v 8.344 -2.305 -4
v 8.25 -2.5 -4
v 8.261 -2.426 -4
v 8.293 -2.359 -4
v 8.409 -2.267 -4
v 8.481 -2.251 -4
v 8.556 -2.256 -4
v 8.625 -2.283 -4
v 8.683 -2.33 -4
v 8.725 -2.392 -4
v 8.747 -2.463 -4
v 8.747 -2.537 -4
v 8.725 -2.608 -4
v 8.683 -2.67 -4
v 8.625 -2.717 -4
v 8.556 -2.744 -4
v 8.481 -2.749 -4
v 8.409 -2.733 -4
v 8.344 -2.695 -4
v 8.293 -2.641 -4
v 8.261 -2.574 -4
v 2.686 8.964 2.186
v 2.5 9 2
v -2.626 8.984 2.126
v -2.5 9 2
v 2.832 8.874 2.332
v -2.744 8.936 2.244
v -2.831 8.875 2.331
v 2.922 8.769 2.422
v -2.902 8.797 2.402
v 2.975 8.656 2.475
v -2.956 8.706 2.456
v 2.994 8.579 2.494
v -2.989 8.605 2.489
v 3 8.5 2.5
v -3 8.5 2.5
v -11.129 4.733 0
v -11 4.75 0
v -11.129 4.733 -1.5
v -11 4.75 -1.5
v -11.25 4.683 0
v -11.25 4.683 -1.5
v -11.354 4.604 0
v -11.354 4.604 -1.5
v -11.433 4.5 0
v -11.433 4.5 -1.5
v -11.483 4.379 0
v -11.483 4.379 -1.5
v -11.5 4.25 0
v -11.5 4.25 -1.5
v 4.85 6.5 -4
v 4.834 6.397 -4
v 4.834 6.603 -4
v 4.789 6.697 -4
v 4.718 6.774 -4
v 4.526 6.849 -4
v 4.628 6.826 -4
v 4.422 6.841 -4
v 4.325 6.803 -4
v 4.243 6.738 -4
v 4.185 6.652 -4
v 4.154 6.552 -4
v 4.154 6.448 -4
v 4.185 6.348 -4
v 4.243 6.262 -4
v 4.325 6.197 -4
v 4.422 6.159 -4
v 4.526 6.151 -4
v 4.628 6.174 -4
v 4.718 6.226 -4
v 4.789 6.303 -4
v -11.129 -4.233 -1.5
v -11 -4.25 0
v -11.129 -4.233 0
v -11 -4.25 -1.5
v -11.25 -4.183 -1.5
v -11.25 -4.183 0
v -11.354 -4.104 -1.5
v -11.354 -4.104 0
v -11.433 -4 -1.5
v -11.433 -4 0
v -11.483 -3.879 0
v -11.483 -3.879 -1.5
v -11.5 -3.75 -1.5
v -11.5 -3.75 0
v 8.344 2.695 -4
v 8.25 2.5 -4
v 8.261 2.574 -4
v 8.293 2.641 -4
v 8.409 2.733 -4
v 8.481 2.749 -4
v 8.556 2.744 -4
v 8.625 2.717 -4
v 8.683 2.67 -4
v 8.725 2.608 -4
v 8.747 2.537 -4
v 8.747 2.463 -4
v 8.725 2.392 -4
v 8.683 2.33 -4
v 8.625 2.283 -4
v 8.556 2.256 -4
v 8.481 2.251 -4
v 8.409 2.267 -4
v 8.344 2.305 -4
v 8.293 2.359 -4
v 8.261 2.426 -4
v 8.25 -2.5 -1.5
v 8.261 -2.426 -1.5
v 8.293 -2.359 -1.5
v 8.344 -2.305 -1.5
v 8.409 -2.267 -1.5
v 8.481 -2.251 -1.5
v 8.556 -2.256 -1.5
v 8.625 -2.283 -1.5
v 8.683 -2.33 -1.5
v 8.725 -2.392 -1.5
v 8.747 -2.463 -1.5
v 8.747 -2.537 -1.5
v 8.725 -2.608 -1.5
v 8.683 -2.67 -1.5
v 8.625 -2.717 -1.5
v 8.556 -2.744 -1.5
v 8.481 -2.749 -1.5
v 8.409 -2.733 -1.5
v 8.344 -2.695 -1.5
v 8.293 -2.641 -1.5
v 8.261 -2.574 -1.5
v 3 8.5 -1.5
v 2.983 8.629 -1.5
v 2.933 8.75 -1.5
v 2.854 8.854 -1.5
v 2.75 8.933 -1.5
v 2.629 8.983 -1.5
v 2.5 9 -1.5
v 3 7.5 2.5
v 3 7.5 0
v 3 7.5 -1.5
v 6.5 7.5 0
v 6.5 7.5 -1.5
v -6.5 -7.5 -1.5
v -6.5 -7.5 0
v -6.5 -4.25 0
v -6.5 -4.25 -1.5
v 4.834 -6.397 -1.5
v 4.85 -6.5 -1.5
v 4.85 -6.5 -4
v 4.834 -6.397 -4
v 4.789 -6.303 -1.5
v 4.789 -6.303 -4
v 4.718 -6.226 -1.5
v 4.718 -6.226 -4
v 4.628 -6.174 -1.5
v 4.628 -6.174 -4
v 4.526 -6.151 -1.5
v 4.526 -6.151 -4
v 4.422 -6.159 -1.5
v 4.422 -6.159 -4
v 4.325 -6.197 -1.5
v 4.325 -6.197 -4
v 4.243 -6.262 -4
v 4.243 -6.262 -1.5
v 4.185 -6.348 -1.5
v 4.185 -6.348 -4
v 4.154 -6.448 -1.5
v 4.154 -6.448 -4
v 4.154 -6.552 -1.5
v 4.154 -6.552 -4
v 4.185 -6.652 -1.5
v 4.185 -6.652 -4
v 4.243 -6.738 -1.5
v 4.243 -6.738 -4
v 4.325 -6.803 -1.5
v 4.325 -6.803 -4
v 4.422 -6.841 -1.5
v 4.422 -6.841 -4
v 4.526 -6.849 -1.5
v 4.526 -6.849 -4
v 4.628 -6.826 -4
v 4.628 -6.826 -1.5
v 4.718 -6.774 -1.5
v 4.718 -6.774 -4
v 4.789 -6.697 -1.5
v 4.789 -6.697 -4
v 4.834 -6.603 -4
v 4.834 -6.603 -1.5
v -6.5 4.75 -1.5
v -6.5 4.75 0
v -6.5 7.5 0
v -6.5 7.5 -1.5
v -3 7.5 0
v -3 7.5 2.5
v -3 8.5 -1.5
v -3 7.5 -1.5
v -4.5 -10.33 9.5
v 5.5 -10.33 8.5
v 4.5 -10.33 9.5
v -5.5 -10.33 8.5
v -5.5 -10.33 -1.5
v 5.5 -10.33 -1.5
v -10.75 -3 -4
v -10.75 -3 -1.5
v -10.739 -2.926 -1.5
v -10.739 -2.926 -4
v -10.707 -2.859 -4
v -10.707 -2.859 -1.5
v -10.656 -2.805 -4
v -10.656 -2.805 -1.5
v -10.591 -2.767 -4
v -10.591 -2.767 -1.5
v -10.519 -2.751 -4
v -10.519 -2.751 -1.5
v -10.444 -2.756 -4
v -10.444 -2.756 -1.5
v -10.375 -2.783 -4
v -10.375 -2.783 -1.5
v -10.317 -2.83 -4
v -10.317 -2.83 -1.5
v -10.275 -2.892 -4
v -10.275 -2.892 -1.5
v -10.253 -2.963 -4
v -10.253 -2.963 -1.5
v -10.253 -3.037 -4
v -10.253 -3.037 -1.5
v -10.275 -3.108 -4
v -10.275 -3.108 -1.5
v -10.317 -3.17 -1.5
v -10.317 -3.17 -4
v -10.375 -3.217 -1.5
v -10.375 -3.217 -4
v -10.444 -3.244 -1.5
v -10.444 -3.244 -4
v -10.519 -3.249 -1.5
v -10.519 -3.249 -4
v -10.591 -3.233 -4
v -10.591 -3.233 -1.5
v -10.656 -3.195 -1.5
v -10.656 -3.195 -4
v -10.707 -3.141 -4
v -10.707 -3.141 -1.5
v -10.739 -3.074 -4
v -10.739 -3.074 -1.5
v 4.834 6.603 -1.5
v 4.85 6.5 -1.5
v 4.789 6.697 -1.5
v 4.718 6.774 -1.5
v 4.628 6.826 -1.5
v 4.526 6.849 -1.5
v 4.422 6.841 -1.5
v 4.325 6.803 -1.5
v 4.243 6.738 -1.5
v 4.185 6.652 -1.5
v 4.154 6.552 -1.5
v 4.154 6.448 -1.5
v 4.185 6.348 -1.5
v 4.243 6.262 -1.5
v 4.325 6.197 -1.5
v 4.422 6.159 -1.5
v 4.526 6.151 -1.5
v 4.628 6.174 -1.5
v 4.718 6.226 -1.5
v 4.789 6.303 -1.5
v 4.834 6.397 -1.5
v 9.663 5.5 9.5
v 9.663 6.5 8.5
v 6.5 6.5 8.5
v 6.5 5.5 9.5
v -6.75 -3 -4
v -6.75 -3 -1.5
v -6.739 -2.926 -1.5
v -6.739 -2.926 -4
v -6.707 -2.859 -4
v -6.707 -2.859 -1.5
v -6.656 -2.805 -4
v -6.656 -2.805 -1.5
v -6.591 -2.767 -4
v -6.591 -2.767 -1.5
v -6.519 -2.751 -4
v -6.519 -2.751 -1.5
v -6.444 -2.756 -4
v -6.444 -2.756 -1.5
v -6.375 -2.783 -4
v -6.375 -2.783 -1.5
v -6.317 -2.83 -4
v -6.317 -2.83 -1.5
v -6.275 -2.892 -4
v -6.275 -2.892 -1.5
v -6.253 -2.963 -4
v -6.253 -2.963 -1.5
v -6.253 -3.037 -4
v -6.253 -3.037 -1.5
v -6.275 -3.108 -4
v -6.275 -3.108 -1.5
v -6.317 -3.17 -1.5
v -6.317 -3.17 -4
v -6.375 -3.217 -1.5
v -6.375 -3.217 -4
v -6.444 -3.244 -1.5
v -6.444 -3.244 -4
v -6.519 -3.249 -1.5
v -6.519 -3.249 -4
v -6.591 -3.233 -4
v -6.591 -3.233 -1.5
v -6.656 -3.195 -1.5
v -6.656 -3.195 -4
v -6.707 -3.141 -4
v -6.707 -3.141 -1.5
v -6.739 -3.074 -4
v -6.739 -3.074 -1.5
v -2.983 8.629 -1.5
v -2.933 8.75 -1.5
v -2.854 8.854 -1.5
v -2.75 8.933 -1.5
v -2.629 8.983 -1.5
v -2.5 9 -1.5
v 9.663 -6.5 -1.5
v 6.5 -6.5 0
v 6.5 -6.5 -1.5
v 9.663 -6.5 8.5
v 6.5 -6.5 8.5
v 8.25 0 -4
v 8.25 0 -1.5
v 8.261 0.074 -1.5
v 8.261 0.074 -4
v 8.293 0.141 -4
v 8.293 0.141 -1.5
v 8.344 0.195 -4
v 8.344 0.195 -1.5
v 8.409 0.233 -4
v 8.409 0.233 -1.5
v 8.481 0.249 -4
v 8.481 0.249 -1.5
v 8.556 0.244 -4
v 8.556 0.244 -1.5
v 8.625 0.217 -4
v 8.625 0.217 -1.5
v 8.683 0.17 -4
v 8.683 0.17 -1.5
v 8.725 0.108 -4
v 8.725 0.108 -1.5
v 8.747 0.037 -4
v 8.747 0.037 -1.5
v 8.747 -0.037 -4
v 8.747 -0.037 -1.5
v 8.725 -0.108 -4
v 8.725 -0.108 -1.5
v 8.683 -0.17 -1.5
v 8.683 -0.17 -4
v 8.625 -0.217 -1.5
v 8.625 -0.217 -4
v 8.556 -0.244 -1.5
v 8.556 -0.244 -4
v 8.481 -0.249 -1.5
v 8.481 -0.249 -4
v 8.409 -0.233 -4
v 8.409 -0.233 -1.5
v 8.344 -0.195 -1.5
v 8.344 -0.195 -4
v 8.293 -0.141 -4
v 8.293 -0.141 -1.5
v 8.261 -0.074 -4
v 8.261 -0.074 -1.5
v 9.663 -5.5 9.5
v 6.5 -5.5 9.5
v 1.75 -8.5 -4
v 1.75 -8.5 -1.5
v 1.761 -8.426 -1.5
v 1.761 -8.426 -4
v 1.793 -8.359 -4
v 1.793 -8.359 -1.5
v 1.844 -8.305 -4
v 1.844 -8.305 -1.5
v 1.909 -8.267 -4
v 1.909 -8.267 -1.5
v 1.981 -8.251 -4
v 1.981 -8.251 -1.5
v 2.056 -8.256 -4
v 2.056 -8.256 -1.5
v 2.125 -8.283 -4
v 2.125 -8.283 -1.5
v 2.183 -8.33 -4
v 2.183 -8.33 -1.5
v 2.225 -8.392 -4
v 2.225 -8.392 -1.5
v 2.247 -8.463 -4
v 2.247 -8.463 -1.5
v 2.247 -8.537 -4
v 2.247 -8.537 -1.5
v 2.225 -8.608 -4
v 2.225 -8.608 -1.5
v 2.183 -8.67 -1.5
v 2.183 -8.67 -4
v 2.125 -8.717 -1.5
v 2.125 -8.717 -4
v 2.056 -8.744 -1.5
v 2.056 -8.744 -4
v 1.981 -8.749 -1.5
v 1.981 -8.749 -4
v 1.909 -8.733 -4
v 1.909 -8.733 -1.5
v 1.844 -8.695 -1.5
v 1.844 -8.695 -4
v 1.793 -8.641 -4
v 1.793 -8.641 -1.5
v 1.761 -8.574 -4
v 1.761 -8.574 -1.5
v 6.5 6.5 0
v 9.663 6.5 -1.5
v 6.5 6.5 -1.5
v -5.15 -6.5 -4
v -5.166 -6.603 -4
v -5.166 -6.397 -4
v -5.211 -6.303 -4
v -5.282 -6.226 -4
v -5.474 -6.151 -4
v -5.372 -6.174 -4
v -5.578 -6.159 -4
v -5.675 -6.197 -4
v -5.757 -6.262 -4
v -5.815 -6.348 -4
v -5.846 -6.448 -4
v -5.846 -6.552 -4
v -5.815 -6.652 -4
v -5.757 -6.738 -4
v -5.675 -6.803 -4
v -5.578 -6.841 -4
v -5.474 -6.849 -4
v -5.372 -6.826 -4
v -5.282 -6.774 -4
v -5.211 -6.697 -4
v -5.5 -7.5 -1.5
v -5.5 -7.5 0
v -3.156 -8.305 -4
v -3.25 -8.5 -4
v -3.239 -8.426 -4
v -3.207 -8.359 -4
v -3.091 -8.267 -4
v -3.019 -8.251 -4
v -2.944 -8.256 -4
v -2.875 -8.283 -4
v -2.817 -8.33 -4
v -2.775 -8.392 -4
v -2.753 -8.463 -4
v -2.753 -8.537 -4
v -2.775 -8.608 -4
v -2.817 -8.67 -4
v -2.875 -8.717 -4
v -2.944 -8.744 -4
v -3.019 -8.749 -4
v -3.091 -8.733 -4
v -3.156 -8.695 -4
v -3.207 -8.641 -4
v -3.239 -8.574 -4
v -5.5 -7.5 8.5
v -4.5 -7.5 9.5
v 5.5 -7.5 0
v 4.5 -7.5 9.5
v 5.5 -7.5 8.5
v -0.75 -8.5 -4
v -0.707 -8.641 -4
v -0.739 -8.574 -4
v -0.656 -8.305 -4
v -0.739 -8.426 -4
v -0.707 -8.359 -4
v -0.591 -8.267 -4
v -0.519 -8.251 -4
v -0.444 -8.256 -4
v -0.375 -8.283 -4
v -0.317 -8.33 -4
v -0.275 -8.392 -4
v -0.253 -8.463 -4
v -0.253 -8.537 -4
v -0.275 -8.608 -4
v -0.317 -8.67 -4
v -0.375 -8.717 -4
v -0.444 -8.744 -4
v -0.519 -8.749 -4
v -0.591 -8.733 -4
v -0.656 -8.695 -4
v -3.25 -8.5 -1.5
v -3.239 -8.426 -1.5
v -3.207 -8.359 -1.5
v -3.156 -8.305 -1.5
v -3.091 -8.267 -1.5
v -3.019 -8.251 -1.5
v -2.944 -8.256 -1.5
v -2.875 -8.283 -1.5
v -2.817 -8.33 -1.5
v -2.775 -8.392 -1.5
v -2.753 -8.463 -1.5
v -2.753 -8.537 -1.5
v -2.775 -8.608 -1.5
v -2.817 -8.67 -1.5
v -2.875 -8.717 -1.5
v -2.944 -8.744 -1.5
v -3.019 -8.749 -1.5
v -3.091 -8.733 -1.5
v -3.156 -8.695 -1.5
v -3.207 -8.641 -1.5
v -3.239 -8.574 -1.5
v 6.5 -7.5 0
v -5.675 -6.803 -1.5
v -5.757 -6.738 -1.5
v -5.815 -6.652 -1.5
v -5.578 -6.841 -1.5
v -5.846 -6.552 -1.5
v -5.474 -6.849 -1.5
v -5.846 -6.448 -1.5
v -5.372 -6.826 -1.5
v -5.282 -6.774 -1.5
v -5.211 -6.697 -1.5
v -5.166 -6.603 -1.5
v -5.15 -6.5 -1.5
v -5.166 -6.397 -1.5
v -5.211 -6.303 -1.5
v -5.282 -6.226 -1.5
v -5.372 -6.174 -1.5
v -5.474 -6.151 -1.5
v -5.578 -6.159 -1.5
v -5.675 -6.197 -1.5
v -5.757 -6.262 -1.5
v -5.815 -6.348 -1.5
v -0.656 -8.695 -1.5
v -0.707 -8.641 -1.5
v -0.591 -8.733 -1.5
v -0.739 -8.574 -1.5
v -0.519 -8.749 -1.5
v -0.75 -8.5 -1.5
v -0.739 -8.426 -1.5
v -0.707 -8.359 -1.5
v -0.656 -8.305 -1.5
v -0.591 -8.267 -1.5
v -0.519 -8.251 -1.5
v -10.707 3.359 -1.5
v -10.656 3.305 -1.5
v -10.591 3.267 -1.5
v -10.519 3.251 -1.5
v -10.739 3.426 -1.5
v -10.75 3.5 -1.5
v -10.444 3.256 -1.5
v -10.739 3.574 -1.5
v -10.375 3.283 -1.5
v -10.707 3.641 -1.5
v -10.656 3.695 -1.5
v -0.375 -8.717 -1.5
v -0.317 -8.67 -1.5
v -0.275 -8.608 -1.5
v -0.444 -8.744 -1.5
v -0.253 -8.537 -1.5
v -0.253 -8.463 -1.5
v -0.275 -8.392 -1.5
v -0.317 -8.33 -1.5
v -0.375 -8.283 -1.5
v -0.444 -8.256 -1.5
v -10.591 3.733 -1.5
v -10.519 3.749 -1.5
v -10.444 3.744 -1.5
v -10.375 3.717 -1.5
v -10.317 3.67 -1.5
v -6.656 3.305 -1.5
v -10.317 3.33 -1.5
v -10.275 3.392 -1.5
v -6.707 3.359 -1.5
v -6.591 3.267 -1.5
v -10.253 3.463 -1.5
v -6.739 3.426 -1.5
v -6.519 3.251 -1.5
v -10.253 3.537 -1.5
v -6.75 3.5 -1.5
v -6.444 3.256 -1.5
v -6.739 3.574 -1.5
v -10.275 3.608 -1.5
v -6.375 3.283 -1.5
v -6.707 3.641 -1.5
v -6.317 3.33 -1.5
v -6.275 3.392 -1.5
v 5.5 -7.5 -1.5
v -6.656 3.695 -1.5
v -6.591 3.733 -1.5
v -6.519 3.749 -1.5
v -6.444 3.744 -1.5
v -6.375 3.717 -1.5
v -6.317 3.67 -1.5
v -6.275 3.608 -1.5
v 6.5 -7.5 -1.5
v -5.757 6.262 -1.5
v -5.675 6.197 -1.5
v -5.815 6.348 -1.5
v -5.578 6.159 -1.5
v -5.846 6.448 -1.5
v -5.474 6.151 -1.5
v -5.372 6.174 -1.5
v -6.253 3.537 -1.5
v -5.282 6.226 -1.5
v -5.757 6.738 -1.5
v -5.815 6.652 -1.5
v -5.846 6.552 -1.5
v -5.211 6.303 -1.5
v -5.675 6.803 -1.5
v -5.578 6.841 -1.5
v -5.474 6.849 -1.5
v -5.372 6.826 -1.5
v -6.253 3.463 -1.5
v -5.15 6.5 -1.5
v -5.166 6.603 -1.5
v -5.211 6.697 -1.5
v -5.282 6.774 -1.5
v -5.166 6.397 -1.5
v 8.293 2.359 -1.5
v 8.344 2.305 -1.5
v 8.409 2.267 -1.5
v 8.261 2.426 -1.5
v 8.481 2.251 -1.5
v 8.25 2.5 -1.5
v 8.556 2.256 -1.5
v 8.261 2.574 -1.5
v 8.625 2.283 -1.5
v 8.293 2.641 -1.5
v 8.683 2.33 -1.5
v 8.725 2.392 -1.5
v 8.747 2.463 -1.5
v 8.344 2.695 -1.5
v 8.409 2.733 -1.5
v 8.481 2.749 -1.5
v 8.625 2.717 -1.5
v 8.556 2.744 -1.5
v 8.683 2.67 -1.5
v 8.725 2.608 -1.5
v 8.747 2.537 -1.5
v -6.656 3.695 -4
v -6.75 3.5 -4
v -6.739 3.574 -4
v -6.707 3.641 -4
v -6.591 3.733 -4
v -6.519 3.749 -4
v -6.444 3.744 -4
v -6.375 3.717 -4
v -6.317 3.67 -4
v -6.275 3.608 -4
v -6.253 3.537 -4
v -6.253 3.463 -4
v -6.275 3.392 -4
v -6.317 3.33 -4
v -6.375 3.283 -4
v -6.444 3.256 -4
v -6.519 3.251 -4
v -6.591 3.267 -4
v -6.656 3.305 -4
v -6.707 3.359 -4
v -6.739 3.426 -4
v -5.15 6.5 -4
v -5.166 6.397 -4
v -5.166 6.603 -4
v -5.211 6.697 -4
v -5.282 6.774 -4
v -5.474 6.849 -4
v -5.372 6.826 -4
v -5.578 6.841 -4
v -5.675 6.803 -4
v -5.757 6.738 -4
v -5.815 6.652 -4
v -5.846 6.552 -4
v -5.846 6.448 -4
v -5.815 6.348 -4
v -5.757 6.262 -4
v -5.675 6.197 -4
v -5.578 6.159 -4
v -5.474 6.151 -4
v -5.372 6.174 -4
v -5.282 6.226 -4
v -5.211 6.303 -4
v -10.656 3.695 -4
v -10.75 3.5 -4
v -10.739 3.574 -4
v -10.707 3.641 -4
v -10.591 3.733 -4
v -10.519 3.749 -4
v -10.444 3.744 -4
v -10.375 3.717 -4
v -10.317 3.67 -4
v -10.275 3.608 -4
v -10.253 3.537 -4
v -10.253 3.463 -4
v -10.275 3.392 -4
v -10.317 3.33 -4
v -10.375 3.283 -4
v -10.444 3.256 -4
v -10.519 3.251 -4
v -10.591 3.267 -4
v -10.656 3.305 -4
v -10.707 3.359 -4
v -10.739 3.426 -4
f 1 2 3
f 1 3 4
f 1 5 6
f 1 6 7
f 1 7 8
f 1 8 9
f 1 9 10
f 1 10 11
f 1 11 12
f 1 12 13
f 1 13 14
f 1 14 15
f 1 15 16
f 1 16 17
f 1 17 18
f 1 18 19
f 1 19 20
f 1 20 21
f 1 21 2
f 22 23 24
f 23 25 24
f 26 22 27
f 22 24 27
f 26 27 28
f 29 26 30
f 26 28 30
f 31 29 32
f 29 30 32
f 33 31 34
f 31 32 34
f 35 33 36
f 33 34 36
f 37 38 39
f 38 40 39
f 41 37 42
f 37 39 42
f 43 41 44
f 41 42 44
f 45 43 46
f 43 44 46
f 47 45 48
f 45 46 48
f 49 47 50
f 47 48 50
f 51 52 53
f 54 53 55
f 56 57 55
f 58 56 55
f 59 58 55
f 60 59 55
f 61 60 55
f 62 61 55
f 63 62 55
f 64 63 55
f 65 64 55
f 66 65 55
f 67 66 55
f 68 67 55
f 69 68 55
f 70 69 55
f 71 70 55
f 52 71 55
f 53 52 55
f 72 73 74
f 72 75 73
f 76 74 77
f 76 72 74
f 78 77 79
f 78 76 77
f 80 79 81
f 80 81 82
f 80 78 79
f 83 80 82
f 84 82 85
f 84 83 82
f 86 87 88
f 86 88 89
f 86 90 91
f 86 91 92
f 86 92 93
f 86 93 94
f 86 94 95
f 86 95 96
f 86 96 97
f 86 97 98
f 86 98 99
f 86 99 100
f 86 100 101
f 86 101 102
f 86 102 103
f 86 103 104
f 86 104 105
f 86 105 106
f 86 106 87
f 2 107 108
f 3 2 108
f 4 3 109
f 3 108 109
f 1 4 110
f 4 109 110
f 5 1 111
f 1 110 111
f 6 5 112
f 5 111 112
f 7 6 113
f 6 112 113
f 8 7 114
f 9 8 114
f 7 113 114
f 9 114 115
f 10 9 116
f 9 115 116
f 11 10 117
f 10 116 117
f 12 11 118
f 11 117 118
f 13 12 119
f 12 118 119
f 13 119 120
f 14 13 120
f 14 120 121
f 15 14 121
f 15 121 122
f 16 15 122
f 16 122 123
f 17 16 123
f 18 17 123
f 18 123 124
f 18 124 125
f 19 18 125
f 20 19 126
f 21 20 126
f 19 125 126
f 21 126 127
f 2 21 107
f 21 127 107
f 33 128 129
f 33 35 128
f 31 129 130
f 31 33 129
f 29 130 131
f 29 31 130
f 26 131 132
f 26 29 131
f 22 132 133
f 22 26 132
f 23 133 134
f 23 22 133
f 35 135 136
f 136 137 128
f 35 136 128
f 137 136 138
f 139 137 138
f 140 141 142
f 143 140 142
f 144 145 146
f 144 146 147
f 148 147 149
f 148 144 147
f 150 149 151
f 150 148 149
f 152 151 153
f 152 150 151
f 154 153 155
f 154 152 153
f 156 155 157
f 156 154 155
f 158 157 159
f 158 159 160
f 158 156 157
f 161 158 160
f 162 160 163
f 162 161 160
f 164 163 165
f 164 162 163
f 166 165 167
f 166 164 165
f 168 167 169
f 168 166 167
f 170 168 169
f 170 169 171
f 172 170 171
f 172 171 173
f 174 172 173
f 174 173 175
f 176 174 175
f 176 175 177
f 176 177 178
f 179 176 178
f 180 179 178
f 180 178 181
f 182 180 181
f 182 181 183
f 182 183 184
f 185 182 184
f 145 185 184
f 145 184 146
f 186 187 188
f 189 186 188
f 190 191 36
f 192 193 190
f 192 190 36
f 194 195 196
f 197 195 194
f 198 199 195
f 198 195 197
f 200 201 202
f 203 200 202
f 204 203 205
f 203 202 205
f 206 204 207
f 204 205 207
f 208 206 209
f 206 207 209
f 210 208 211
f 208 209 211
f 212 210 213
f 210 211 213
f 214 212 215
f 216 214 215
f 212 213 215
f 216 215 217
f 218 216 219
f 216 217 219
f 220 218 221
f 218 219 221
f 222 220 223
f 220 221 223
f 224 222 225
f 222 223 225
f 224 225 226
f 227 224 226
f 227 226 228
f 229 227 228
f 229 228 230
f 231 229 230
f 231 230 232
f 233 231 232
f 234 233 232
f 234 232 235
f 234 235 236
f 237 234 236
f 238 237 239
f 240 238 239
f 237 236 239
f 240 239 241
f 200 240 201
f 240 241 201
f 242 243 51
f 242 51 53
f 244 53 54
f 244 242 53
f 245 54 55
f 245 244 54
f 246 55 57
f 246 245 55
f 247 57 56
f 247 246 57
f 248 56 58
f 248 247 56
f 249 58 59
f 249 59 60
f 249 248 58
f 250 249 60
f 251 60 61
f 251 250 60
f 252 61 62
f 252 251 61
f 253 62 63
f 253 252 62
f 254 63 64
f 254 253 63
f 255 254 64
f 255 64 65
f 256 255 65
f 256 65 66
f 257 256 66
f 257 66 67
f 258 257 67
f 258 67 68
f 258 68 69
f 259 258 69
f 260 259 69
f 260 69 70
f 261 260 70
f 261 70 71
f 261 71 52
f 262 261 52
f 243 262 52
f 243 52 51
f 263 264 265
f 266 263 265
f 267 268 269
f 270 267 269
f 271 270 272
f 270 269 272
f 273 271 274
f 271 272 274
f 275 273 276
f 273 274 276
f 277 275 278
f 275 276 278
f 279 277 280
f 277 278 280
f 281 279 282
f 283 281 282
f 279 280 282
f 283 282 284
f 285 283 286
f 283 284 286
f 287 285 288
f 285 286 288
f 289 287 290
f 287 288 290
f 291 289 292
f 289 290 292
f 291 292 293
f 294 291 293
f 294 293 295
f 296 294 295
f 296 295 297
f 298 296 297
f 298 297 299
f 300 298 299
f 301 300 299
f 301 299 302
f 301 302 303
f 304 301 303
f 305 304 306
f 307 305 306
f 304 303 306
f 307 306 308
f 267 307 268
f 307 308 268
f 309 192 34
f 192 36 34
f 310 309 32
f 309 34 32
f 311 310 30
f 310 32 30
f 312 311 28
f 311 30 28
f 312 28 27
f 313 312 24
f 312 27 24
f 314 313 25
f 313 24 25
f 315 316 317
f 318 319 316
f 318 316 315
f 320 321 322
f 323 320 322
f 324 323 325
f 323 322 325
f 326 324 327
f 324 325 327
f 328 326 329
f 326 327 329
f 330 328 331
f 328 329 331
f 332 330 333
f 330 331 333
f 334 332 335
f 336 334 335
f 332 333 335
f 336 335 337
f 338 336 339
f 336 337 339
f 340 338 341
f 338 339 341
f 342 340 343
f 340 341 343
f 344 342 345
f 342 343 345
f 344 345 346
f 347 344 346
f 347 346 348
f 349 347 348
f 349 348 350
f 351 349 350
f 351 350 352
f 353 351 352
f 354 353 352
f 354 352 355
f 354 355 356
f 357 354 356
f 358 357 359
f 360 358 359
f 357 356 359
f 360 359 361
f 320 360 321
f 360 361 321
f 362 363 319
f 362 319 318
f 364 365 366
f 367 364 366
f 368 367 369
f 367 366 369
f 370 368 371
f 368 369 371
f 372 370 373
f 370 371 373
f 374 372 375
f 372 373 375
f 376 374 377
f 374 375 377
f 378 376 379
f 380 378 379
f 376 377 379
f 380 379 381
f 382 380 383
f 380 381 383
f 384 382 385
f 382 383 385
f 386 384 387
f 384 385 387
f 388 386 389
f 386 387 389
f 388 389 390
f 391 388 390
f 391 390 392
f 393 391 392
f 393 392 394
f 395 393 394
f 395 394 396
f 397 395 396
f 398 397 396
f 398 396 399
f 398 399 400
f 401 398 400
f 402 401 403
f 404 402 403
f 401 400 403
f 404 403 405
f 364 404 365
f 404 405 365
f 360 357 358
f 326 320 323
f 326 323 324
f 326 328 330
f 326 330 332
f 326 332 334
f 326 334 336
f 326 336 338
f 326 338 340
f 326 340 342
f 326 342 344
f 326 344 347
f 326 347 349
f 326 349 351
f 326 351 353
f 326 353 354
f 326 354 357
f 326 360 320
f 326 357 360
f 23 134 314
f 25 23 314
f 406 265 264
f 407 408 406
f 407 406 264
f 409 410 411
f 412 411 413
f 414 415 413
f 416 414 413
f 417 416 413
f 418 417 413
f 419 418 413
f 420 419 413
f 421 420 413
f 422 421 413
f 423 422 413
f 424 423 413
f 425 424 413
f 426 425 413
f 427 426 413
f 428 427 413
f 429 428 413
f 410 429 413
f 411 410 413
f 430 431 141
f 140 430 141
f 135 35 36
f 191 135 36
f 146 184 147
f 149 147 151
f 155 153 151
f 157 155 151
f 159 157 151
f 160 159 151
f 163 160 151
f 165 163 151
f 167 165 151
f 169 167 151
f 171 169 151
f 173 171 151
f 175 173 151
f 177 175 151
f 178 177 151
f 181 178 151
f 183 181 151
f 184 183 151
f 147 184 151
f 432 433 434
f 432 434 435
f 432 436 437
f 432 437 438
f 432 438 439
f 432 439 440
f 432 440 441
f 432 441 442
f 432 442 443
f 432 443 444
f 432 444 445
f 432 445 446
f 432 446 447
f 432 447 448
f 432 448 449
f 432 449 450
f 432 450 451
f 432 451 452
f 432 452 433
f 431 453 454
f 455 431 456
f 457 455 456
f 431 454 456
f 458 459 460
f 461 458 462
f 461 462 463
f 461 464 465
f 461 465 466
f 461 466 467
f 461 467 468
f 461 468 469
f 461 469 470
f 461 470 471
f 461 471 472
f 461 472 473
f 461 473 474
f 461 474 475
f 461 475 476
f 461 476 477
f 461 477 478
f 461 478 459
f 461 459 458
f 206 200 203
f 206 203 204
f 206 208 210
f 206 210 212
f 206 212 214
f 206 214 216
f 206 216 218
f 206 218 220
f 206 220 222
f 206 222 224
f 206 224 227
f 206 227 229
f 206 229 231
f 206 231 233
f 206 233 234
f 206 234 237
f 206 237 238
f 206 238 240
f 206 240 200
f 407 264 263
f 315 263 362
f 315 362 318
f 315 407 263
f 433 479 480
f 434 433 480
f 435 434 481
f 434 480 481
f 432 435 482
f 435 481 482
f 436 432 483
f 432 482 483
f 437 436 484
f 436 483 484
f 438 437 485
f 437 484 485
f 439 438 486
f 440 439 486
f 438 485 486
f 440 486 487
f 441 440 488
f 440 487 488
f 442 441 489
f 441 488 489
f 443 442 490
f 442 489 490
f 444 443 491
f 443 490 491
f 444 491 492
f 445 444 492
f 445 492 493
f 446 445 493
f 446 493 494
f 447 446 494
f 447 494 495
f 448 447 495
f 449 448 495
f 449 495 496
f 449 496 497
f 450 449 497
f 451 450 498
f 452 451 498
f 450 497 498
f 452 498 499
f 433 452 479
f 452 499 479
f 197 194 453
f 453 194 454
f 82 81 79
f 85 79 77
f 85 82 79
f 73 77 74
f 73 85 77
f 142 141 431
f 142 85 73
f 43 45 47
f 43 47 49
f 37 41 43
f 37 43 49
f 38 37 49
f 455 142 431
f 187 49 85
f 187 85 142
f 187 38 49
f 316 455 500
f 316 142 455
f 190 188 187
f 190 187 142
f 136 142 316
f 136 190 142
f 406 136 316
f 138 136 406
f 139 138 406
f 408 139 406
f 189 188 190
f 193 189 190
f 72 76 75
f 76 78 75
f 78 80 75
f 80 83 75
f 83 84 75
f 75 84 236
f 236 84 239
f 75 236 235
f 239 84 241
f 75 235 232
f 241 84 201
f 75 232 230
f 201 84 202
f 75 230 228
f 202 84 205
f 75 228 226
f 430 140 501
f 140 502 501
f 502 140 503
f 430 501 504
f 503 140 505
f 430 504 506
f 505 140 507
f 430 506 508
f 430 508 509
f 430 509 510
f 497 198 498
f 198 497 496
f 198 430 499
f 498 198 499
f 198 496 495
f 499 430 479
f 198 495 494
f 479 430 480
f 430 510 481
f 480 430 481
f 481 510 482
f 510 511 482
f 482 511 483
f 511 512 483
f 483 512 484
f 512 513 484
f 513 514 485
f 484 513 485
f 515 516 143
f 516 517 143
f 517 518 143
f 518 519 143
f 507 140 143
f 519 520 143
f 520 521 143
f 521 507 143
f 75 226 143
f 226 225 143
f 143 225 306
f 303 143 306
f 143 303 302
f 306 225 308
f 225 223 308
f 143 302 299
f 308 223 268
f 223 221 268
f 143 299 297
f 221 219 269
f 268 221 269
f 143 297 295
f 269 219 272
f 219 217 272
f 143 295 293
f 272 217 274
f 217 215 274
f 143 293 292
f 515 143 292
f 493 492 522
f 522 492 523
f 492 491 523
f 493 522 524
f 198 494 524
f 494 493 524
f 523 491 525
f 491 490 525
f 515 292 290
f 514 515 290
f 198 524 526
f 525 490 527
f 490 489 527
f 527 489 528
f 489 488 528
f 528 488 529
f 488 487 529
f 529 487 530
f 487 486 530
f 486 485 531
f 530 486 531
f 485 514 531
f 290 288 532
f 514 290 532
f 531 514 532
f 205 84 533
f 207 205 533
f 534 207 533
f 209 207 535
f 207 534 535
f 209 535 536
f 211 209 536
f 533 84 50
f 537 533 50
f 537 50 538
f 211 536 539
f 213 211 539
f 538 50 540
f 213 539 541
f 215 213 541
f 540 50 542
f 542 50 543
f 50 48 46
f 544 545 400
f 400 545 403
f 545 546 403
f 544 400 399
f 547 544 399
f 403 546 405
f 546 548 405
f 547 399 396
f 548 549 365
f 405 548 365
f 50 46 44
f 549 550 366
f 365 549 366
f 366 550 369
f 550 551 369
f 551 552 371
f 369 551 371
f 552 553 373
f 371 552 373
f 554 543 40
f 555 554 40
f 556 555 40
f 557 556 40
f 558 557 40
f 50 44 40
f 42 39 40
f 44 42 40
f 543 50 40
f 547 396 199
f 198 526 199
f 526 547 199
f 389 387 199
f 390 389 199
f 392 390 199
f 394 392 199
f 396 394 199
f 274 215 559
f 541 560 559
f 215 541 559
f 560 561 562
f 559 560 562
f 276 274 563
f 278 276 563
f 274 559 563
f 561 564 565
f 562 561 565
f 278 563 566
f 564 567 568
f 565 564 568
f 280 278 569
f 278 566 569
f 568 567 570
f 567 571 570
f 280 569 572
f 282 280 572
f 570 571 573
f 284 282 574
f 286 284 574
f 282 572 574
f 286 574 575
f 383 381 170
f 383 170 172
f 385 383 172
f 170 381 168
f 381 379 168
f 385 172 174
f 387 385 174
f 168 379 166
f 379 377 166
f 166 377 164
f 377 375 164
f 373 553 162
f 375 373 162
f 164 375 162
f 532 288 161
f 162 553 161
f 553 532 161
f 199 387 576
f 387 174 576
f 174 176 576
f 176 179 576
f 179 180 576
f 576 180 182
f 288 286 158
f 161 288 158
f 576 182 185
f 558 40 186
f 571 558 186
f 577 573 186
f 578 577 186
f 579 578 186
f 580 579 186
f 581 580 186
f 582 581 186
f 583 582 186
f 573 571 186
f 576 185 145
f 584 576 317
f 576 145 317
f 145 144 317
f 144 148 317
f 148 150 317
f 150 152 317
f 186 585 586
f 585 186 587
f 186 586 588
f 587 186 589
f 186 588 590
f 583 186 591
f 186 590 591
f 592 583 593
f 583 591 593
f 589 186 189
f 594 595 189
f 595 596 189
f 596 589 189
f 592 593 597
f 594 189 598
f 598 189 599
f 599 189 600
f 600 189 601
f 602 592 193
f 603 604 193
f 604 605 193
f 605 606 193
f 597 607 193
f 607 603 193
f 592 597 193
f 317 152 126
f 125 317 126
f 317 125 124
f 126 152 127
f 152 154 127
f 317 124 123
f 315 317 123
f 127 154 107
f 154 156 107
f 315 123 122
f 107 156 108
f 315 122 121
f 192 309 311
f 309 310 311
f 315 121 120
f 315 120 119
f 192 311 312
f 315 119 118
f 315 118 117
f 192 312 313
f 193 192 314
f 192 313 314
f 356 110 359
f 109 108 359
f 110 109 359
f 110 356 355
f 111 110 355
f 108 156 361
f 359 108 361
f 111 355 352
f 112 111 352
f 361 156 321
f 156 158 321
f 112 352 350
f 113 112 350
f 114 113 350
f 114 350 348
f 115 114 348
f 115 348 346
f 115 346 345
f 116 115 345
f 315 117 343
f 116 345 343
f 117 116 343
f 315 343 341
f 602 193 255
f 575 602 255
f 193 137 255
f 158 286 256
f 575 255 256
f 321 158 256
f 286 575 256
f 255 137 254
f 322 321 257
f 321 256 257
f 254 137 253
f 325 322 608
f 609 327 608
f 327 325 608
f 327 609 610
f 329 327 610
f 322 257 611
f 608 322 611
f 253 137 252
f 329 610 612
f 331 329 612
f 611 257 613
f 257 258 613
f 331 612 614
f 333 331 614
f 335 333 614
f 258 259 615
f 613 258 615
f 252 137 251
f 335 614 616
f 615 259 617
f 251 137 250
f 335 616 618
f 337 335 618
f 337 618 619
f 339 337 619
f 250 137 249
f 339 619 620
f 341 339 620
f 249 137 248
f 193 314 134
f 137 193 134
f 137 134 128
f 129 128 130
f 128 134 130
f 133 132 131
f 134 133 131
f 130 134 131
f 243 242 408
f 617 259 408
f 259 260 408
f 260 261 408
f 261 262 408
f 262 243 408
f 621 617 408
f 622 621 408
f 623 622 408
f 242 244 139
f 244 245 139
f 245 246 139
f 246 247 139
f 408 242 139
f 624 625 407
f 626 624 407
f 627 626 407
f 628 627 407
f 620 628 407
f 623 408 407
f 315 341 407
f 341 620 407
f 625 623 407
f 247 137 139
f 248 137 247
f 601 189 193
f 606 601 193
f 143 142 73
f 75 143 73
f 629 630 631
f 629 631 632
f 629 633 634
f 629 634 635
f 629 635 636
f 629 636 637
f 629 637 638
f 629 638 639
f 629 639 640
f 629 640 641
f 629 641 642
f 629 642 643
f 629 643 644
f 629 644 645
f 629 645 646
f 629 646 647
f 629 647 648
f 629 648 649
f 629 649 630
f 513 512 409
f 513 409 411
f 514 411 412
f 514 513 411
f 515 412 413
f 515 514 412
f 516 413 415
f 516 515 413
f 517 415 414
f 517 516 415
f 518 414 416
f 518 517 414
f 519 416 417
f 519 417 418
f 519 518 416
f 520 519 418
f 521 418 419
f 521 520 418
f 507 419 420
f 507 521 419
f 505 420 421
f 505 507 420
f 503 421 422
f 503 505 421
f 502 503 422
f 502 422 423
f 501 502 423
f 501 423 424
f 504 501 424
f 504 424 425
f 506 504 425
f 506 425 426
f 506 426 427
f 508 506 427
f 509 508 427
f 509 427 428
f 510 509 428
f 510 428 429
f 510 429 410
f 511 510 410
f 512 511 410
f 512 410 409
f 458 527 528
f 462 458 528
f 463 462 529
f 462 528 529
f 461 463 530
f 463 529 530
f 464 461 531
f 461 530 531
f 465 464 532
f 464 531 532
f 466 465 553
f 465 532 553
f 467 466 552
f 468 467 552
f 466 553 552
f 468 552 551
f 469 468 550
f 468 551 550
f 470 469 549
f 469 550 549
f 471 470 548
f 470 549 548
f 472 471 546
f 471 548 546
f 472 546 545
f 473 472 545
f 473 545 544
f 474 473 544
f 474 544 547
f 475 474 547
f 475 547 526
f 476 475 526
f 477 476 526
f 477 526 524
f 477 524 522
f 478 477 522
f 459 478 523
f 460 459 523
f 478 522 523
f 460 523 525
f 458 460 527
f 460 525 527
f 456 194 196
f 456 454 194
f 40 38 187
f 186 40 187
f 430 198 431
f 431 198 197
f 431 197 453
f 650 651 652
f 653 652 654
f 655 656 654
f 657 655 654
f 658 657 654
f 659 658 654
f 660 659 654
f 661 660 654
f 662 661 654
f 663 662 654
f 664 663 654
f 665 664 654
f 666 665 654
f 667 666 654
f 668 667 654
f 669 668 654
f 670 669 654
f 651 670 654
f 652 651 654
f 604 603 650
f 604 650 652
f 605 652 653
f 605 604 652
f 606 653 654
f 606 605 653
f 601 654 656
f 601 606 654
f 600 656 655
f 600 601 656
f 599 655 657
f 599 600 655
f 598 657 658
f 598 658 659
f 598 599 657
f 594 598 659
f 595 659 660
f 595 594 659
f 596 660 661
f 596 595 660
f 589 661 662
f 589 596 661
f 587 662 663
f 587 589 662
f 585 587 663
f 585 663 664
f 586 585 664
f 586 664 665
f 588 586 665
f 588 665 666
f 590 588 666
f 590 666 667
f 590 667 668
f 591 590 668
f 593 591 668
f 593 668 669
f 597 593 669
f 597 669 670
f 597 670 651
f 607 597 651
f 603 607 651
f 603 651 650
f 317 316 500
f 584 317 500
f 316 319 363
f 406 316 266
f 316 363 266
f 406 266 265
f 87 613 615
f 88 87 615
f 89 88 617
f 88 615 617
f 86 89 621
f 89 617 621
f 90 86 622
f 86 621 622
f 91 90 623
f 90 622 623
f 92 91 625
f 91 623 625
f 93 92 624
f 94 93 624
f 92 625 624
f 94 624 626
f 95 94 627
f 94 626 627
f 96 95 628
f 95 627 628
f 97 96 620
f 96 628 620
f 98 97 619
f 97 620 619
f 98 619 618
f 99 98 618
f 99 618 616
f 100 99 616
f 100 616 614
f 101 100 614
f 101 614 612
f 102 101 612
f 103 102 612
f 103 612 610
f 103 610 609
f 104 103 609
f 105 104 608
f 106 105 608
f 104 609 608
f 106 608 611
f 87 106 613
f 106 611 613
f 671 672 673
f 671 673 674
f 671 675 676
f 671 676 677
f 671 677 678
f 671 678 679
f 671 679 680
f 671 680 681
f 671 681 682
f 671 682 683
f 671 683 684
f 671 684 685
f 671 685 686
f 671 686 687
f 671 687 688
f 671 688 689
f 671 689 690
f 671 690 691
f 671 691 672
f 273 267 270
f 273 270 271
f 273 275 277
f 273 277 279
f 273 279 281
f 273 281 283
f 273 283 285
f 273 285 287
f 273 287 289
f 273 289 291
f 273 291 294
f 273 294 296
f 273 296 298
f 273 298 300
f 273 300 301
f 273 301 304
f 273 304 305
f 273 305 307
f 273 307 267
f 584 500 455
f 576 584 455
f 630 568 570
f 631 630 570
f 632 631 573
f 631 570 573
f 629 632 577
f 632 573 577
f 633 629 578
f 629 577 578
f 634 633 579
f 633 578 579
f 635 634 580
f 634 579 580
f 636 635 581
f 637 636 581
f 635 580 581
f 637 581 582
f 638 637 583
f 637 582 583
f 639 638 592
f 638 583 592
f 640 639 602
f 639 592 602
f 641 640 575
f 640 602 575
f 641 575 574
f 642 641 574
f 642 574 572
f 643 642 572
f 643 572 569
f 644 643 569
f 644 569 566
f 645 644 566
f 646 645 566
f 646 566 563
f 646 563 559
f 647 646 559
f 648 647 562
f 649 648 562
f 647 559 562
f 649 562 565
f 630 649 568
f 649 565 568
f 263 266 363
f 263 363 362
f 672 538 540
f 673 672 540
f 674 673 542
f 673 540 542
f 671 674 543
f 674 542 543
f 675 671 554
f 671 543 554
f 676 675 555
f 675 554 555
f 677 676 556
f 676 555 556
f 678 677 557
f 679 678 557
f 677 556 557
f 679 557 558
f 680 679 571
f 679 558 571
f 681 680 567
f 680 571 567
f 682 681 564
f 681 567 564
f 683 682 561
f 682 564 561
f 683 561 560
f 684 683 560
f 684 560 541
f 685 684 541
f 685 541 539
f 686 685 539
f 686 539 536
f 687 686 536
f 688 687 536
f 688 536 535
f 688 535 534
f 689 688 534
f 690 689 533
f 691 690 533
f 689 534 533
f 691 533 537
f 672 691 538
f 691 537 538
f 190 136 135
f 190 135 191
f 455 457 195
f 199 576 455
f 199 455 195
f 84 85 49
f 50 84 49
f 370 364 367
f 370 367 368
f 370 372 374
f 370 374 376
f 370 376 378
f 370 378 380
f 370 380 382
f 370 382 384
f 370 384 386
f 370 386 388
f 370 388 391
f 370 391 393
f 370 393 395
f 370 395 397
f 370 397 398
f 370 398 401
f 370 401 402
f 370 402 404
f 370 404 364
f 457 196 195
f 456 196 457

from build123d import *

# Parameters (mm, degrees)
RESSALTO_EXTRUS_O4_DEPTH  = 1.5
ESBO_O5_W                 = 6
ESBO_O5_H                 = 1.5
RESSALTO_EXTRUS_O6_DEPTH  = 4
RESSALTO_EXTRUS_O7_DEPTH  = 11
ESBO_O8_W                 = 2.01
ESBO_O8_H                 = 1.51
RESSALTO_EXTRUS_O15_DEPTH = 11
ESBO_O9_W                 = 1.51
ESBO_O9_H                 = 2.01
RESSALTO_EXTRUS_O16_DEPTH = 11
ESBO_O10_R                = 0.25
RESSALTO_EXTRUS_O17_DEPTH = 2.5
ESBO_O11_R                = 0.35
RESSALTO_EXTRUS_O18_DEPTH = 4
ESBO_O12_R                = 0.25
RESSALTO_EXTRUS_O19_DEPTH = 2.5
CHANFRO1_SIZE             = 1
FILETE2_R                 = 0.5


with BuildPart() as part:
    # Esboço3 → Ressalto-extrusão4 (new body)
    with BuildSketch(Plane(origin=(0, 0, 0), x_dir=(-1, 0, 0), z_dir=(0, 0, -1))):
        Polygon((11.5, 4.75), (6.5, 4.75), (6.5, 7.5), (-6.5, 7.5), (-6.5, 6.5), (-8.5, 6.5), (-8.5, 5), (-6.5, 5), (-6.5, -5), (-8.5, -5), (-8.5, -6.5), (-6.5, -6.5), (-6.5, -7.5), (-5.5, -7.5), (-5.5, -9.5), (-4, -9.5), (-4, -7.5), (4, -7.5), (4, -9.5), (5.5, -9.5), (5.5, -7.5), (6.5, -7.5), (6.5, -4.25), (11.5, -4.25), align=None)
    extrude(amount=RESSALTO_EXTRUS_O4_DEPTH)

    # Esboço5 → Ressalto-extrusão6 (add)
    with BuildSketch(Plane(origin=(0, 0, -1.5), x_dir=(-1, 0, 0), z_dir=(0, 0, -1))):
        with Locations((0, 8.25)):
            Rectangle(ESBO_O5_W, ESBO_O5_H)
    extrude(amount=-RESSALTO_EXTRUS_O6_DEPTH)

    # Esboço6 → Ressalto-extrusão7 (add)
    with BuildSketch(Plane(origin=(0, 0, -1.5), x_dir=(-1, 0, 0), z_dir=(0, 0, -1))):
        Polygon((-6.5, 4.99), (-8.51, 4.99), (-8.51, 6.5), (-9.663134603, 6.5), (-9.663134603, -6.5), (-8.51, -6.5), (-8.51, -4.99), (-6.5, -4.99), align=None)
        Polygon((-3.99, -7.5), (-3.99, -9.51), (-5.5, -9.51), (-5.5, -10.329816926), (5.5, -10.329816926), (5.5, -9.51), (3.99, -9.51), (3.99, -7.5), align=None)
    extrude(amount=-RESSALTO_EXTRUS_O7_DEPTH)

    # Esboço8 → Ressalto-extrusão15 (add)
    with BuildSketch(Plane.XY.offset(9.5)):
        with Locations((7.505, -5.745)):
            Rectangle(ESBO_O8_W, ESBO_O8_H)
        with Locations((7.505, 5.745)):
            Rectangle(ESBO_O8_W, ESBO_O8_H)
    extrude(amount=-RESSALTO_EXTRUS_O15_DEPTH)

    # Esboço9 → Ressalto-extrusão16 (add)
    with BuildSketch(Plane.XY.offset(9.5)):
        with Locations((-4.745, -8.505)):
            Rectangle(ESBO_O9_W, ESBO_O9_H)
        with Locations((4.745, -8.505)):
            Rectangle(ESBO_O9_W, ESBO_O9_H)
    extrude(amount=-RESSALTO_EXTRUS_O16_DEPTH)

    # Esboço10 → Ressalto-extrusão17 (add)
    with BuildSketch(Plane(origin=(0, 0, -1.5), x_dir=(-1, 0, 0), z_dir=(0, 0, -1))):
        with Locations((10.5, 3.5)):
            Circle(ESBO_O10_R)
        with Locations((6.5, 3.5)):
            Circle(ESBO_O10_R)
        with Locations((10.5, -3)):
            Circle(ESBO_O10_R)
        with Locations((6.5, -3)):
            Circle(ESBO_O10_R)
    extrude(amount=RESSALTO_EXTRUS_O17_DEPTH)

    # Esboço11 → Ressalto-extrusão18 (add)
    with BuildSketch(Plane.XY):
        with Locations((-5.5, 6.5)):
            Circle(ESBO_O11_R)
        with Locations((4.5, 6.5)):
            Circle(ESBO_O11_R)
        with Locations((4.5, -6.5)):
            Circle(ESBO_O11_R)
        with Locations((-5.5, -6.5)):
            Circle(ESBO_O11_R)
    extrude(amount=-RESSALTO_EXTRUS_O18_DEPTH)

    # Esboço12 → Ressalto-extrusão19 (add)
    with BuildSketch(Plane(origin=(0, 0, -1.5), x_dir=(-1, 0, 0), z_dir=(0, 0, -1))):
        with Locations((3, -8.5)):
            Circle(ESBO_O12_R)
        with Locations((0.5, -8.5)):
            Circle(ESBO_O12_R)
        with Locations((-2, -8.5)):
            Circle(ESBO_O12_R)
        with Locations((-8.5, -2.5)):
            Circle(ESBO_O12_R)
        with Locations((-8.5, 0)):
            Circle(ESBO_O12_R)
        with Locations((-8.5, 2.5)):
            Circle(ESBO_O12_R)
    extrude(amount=RESSALTO_EXTRUS_O19_DEPTH)

    # Chanfro1
    chanfro1_edges = [part.edges().sort_by_distance(p)[0] for p in [
        (-5.5, -8.914908463, 9.5),
        (5.5, -8.914908463, 9.5),
        (8.081567302, -6.5, 9.5),
        (8.081567302, 6.5, 9.5),
    ]]
    chamfer(chanfro1_edges, length=CHANFRO1_SIZE)

    # Filete2
    filete2_edges = [part.edges().sort_by_distance(p)[0] for p in [
        (-11.5, 4.75, -0.75),
        (-11.5, -4.25, -0.75),
        (-3, 9, 0.5),
        (0, 9, 2.5),
        (3, 9, 0.5),
    ]]
    fillet(filete2_edges, radius=FILETE2_R)


solid = part.part
